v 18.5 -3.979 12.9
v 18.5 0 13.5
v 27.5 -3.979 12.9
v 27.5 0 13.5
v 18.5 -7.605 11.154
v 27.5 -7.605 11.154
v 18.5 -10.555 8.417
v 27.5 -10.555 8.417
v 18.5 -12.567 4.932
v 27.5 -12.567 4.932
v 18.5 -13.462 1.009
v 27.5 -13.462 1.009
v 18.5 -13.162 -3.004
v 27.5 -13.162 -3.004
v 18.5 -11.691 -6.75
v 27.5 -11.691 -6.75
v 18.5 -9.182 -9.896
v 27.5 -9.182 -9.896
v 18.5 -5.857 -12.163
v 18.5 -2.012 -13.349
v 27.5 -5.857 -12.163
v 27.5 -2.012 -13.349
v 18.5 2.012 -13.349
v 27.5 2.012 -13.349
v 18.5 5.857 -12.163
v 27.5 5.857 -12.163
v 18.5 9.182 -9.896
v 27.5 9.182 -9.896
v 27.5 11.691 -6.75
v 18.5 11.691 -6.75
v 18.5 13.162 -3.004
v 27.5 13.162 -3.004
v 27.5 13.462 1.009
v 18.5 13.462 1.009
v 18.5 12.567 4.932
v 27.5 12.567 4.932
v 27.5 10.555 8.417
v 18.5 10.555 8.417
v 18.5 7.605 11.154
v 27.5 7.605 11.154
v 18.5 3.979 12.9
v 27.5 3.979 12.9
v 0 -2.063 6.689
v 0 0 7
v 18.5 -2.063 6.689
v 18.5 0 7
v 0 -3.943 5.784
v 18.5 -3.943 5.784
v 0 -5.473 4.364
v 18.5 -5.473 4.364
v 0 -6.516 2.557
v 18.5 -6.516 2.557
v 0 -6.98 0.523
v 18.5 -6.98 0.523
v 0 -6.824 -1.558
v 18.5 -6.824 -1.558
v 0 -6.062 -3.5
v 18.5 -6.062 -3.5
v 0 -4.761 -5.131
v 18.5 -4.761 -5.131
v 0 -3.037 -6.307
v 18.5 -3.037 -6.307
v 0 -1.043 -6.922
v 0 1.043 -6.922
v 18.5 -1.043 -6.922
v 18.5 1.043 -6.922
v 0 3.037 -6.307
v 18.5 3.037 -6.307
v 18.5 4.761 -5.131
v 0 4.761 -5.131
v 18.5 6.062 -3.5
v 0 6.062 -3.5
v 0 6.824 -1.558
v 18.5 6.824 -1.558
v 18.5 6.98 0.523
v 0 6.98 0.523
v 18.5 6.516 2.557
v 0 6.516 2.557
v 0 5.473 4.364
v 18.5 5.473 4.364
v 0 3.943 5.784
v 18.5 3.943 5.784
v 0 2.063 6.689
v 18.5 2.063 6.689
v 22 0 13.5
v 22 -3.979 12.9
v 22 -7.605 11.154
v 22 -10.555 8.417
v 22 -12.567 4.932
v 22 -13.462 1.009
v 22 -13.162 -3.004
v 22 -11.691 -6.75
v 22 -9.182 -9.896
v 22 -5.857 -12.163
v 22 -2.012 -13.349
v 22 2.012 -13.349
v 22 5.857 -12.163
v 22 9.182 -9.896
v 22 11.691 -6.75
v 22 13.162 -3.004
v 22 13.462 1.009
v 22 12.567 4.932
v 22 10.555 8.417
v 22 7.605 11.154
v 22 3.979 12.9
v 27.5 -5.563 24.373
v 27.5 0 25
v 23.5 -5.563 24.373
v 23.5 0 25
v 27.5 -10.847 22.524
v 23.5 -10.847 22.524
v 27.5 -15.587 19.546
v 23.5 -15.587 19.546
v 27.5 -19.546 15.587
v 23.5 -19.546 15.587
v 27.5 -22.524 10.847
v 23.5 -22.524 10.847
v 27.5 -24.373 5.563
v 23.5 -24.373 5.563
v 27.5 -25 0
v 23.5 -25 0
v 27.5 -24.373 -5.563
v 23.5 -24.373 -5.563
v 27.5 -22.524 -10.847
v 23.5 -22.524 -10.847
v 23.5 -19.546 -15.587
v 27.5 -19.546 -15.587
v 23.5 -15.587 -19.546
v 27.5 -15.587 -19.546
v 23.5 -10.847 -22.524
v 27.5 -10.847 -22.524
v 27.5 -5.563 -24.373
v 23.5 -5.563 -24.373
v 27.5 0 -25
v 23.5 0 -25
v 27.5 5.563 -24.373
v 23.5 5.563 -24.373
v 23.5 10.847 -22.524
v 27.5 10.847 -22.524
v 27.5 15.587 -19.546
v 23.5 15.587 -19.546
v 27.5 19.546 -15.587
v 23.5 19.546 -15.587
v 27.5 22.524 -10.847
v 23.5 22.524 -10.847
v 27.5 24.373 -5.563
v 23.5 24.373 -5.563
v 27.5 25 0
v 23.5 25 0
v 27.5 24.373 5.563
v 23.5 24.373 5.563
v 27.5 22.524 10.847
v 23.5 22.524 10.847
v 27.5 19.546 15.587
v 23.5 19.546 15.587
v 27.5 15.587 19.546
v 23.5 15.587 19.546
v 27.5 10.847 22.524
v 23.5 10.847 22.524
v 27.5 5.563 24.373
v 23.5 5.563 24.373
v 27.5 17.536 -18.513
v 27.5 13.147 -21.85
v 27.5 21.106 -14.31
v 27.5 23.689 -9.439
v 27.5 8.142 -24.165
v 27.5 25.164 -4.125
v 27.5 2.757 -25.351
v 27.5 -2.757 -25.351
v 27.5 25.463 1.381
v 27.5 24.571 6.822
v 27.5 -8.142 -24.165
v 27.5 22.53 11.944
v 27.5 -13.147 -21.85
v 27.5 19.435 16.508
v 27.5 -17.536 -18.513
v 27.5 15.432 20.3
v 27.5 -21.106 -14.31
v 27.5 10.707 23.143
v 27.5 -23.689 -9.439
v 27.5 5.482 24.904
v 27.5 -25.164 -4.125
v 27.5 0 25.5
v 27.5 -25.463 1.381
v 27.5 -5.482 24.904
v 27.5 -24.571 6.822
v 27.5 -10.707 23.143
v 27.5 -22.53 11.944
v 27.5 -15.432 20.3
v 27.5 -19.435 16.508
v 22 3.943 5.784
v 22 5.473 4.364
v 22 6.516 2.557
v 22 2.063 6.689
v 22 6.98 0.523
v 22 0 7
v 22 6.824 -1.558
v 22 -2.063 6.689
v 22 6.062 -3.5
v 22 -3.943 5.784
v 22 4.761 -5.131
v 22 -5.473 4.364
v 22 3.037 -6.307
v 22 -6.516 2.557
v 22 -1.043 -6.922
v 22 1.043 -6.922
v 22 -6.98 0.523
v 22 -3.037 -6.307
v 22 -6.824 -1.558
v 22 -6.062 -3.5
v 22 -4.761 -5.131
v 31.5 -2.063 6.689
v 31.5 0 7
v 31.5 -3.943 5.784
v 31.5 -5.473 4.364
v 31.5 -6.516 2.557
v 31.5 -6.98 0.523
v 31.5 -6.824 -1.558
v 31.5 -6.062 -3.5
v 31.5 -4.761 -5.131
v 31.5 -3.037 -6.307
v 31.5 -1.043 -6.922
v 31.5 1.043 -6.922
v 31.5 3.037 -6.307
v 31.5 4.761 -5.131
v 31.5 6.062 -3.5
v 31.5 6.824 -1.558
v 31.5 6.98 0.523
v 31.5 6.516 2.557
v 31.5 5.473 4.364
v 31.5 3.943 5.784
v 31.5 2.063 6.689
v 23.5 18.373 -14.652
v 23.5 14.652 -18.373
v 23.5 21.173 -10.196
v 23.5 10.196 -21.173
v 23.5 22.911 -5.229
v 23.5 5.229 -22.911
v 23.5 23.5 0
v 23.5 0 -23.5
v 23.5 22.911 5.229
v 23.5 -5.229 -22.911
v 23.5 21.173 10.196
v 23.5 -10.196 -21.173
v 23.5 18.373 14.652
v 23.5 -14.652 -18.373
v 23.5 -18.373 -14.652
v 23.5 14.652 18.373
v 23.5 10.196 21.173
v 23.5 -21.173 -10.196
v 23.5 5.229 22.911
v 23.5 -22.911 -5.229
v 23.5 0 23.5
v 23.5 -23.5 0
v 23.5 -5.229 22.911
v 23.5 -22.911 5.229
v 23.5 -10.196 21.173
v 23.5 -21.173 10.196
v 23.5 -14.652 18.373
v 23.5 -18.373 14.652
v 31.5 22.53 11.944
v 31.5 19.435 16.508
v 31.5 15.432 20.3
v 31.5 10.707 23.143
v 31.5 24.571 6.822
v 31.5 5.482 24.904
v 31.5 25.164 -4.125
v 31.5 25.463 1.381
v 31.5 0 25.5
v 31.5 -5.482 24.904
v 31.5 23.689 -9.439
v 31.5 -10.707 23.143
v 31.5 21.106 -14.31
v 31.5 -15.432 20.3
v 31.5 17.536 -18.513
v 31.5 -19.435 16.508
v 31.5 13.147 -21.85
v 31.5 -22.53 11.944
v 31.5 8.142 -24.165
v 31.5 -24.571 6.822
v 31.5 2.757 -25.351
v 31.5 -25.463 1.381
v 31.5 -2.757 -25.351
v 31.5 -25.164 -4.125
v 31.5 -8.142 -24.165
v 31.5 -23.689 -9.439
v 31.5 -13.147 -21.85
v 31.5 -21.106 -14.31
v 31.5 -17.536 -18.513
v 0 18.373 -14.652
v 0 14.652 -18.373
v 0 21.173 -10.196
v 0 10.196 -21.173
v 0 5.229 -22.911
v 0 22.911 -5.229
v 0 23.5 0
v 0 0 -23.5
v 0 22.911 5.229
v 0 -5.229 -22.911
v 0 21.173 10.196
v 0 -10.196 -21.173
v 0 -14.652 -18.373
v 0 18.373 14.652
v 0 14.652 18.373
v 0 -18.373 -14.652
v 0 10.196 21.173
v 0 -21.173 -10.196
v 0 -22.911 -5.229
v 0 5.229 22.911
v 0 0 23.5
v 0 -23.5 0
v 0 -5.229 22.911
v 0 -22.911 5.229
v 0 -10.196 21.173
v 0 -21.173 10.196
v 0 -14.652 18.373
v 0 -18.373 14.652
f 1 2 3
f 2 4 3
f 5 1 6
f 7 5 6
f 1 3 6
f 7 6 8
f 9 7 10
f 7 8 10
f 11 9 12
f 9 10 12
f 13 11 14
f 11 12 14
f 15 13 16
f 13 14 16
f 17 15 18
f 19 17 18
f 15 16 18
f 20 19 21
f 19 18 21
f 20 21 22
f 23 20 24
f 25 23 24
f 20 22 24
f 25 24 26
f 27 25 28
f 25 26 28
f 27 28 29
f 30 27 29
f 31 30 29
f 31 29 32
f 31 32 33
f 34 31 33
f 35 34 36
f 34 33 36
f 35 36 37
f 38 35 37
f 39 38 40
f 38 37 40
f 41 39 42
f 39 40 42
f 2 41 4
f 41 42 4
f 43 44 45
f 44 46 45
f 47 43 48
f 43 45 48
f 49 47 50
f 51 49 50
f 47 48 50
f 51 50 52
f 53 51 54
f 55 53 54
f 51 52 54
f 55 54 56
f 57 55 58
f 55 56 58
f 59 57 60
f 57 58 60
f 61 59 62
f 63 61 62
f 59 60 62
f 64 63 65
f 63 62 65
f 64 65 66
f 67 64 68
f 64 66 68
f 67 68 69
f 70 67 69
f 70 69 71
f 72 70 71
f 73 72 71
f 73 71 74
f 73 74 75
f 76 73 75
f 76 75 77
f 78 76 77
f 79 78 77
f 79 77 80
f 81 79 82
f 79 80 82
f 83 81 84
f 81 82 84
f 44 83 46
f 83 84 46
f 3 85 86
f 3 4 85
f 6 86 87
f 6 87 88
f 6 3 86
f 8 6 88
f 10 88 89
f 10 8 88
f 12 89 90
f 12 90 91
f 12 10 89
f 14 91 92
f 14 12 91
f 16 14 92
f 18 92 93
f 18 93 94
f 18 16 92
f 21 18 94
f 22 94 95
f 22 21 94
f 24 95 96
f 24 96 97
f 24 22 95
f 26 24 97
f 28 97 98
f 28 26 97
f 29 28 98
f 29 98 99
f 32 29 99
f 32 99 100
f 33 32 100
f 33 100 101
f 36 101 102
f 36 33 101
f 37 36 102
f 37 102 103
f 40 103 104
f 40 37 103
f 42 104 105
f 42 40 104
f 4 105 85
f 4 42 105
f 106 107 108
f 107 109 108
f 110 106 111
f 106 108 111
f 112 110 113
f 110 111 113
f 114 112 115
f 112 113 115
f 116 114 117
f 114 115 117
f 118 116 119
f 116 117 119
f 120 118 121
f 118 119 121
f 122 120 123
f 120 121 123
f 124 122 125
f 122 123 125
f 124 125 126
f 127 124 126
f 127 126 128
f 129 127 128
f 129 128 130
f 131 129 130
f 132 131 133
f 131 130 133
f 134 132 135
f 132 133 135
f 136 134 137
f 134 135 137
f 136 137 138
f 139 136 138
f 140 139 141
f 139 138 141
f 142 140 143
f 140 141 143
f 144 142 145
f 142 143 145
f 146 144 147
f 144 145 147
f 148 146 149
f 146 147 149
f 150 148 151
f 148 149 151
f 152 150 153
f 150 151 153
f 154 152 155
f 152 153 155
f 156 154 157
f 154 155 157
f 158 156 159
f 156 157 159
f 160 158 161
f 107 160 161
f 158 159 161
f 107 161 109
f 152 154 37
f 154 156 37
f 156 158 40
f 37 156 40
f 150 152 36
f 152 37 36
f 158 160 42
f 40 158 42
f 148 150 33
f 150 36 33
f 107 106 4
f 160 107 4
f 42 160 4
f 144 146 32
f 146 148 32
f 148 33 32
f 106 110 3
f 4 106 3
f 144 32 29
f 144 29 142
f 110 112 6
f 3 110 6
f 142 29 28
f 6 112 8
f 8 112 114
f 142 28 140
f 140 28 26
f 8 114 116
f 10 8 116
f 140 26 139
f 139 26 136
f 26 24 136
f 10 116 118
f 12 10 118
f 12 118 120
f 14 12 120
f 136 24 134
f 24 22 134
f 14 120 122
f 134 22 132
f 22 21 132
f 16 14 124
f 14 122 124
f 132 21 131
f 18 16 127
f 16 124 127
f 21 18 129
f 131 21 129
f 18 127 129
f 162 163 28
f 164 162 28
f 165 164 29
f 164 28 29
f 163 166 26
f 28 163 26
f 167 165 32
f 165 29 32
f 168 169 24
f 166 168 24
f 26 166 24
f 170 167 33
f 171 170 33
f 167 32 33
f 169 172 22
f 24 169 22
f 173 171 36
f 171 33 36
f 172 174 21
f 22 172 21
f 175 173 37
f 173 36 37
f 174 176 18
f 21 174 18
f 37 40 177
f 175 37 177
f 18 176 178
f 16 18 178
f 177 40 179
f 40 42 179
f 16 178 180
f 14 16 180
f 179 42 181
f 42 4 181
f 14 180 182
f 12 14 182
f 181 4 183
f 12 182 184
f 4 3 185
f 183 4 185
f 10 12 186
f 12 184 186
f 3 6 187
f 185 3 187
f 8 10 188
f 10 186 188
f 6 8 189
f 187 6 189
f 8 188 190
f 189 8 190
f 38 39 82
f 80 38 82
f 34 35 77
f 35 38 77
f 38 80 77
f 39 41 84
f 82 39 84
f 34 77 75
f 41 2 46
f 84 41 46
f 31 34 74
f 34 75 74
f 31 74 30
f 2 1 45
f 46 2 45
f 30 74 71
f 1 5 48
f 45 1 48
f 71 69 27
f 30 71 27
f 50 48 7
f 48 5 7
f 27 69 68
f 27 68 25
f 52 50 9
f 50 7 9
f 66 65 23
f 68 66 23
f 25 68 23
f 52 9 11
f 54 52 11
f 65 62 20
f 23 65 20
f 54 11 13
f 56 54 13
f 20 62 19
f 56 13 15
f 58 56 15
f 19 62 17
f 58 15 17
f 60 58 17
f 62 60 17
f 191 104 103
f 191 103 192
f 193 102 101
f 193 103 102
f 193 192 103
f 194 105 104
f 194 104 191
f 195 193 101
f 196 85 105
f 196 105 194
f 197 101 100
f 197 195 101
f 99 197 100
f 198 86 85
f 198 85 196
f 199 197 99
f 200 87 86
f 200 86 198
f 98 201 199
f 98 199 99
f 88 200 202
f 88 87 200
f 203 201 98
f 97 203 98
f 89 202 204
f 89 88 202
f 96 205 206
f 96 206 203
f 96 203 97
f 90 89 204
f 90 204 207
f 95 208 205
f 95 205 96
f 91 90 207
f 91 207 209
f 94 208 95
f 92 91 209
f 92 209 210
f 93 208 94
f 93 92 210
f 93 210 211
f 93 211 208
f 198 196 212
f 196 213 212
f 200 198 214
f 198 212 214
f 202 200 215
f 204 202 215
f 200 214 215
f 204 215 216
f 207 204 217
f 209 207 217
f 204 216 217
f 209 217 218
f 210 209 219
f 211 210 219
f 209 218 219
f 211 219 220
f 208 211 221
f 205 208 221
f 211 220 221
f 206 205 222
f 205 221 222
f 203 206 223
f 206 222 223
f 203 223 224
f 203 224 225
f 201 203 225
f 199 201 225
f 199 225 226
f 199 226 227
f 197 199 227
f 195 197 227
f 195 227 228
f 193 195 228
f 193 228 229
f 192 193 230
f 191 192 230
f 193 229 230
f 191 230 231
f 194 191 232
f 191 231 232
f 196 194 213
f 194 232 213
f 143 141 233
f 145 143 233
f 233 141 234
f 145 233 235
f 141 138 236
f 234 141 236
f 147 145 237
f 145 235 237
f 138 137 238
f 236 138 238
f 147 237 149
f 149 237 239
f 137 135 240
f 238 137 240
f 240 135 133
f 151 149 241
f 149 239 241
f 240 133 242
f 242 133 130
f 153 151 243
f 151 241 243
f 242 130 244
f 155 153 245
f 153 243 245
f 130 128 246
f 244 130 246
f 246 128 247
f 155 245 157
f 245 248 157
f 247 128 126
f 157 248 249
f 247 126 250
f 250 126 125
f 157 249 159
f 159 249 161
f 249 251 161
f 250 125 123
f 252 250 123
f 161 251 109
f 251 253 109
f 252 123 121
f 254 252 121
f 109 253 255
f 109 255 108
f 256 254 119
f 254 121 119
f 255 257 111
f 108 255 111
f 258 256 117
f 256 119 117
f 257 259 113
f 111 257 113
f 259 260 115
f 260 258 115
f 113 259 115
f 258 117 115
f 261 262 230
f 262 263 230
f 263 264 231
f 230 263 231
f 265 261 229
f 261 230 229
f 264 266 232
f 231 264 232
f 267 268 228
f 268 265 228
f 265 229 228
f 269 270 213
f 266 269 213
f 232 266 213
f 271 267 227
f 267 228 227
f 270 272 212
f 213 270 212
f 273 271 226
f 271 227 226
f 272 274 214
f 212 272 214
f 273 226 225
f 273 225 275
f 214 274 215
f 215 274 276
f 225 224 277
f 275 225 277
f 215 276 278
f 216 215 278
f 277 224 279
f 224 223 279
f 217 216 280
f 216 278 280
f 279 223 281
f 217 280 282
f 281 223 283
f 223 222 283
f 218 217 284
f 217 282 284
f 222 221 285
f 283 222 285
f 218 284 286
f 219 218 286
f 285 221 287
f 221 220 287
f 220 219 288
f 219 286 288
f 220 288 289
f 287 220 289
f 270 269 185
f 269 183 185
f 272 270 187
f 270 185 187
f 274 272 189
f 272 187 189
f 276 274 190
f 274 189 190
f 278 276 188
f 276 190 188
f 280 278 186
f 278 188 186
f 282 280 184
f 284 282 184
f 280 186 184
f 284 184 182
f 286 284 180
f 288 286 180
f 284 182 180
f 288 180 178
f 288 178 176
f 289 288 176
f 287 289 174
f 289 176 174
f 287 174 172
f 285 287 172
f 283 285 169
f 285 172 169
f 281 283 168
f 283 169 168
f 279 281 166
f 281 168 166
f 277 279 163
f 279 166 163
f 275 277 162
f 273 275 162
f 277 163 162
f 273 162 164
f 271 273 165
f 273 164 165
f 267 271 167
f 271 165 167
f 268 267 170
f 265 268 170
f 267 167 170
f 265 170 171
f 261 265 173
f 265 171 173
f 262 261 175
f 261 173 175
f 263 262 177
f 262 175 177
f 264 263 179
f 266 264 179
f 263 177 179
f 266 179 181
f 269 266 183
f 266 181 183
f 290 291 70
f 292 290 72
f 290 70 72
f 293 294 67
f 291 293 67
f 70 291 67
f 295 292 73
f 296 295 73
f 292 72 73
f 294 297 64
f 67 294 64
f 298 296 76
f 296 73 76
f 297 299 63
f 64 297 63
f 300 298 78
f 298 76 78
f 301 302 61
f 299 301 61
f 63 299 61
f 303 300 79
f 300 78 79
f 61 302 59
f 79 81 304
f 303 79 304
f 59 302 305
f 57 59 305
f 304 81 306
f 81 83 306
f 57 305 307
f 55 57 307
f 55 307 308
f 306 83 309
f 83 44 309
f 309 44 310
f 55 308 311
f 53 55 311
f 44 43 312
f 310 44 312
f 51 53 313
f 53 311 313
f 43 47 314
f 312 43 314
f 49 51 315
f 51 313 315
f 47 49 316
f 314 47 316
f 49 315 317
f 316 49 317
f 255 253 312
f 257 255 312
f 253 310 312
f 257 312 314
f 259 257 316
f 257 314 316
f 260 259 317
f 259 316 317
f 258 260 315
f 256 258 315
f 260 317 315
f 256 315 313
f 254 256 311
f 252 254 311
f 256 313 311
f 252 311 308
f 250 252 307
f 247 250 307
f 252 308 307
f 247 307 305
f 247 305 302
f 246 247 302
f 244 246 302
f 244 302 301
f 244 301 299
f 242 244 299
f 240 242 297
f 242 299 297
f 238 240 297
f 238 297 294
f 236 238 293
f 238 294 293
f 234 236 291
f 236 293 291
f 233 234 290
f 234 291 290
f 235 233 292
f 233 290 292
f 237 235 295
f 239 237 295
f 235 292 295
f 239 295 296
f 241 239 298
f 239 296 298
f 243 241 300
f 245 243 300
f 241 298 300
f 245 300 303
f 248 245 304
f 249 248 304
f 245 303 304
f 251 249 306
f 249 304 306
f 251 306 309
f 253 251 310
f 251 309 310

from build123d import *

# Parameters (mm, degrees)
F2_W = 5.5
F2_H = 6.5


with BuildPart() as f1:
    # F0 (on Front) → F1 (revolve)
    with BuildSketch(Plane.XZ):
        Polygon((0, 23.5), (0, 7), (18.5, 7), (18.5, 13.5), (27.5, 13.5), (27.5, 25), (23.5, 25), (23.5, 23.5), align=None)
    revolve(axis=Axis((13.75, 0, 0), (1, 0, 0)))


with BuildPart() as f3:
    # F2 (on Front) → F3 (revolve)
    with BuildSketch(Plane.XZ):
        Polygon((27.5, 13.5), (27.5, 7), (31.5, 7), (31.5, 25.5), (27.5, 25.5), align=None)
        with Locations((24.75, 10.25)):
            Rectangle(F2_W, F2_H)
    revolve(axis=Axis((26.75, 0, 0), (1, 0, 0)))


solid = Compound([f1.part, f3.part])
